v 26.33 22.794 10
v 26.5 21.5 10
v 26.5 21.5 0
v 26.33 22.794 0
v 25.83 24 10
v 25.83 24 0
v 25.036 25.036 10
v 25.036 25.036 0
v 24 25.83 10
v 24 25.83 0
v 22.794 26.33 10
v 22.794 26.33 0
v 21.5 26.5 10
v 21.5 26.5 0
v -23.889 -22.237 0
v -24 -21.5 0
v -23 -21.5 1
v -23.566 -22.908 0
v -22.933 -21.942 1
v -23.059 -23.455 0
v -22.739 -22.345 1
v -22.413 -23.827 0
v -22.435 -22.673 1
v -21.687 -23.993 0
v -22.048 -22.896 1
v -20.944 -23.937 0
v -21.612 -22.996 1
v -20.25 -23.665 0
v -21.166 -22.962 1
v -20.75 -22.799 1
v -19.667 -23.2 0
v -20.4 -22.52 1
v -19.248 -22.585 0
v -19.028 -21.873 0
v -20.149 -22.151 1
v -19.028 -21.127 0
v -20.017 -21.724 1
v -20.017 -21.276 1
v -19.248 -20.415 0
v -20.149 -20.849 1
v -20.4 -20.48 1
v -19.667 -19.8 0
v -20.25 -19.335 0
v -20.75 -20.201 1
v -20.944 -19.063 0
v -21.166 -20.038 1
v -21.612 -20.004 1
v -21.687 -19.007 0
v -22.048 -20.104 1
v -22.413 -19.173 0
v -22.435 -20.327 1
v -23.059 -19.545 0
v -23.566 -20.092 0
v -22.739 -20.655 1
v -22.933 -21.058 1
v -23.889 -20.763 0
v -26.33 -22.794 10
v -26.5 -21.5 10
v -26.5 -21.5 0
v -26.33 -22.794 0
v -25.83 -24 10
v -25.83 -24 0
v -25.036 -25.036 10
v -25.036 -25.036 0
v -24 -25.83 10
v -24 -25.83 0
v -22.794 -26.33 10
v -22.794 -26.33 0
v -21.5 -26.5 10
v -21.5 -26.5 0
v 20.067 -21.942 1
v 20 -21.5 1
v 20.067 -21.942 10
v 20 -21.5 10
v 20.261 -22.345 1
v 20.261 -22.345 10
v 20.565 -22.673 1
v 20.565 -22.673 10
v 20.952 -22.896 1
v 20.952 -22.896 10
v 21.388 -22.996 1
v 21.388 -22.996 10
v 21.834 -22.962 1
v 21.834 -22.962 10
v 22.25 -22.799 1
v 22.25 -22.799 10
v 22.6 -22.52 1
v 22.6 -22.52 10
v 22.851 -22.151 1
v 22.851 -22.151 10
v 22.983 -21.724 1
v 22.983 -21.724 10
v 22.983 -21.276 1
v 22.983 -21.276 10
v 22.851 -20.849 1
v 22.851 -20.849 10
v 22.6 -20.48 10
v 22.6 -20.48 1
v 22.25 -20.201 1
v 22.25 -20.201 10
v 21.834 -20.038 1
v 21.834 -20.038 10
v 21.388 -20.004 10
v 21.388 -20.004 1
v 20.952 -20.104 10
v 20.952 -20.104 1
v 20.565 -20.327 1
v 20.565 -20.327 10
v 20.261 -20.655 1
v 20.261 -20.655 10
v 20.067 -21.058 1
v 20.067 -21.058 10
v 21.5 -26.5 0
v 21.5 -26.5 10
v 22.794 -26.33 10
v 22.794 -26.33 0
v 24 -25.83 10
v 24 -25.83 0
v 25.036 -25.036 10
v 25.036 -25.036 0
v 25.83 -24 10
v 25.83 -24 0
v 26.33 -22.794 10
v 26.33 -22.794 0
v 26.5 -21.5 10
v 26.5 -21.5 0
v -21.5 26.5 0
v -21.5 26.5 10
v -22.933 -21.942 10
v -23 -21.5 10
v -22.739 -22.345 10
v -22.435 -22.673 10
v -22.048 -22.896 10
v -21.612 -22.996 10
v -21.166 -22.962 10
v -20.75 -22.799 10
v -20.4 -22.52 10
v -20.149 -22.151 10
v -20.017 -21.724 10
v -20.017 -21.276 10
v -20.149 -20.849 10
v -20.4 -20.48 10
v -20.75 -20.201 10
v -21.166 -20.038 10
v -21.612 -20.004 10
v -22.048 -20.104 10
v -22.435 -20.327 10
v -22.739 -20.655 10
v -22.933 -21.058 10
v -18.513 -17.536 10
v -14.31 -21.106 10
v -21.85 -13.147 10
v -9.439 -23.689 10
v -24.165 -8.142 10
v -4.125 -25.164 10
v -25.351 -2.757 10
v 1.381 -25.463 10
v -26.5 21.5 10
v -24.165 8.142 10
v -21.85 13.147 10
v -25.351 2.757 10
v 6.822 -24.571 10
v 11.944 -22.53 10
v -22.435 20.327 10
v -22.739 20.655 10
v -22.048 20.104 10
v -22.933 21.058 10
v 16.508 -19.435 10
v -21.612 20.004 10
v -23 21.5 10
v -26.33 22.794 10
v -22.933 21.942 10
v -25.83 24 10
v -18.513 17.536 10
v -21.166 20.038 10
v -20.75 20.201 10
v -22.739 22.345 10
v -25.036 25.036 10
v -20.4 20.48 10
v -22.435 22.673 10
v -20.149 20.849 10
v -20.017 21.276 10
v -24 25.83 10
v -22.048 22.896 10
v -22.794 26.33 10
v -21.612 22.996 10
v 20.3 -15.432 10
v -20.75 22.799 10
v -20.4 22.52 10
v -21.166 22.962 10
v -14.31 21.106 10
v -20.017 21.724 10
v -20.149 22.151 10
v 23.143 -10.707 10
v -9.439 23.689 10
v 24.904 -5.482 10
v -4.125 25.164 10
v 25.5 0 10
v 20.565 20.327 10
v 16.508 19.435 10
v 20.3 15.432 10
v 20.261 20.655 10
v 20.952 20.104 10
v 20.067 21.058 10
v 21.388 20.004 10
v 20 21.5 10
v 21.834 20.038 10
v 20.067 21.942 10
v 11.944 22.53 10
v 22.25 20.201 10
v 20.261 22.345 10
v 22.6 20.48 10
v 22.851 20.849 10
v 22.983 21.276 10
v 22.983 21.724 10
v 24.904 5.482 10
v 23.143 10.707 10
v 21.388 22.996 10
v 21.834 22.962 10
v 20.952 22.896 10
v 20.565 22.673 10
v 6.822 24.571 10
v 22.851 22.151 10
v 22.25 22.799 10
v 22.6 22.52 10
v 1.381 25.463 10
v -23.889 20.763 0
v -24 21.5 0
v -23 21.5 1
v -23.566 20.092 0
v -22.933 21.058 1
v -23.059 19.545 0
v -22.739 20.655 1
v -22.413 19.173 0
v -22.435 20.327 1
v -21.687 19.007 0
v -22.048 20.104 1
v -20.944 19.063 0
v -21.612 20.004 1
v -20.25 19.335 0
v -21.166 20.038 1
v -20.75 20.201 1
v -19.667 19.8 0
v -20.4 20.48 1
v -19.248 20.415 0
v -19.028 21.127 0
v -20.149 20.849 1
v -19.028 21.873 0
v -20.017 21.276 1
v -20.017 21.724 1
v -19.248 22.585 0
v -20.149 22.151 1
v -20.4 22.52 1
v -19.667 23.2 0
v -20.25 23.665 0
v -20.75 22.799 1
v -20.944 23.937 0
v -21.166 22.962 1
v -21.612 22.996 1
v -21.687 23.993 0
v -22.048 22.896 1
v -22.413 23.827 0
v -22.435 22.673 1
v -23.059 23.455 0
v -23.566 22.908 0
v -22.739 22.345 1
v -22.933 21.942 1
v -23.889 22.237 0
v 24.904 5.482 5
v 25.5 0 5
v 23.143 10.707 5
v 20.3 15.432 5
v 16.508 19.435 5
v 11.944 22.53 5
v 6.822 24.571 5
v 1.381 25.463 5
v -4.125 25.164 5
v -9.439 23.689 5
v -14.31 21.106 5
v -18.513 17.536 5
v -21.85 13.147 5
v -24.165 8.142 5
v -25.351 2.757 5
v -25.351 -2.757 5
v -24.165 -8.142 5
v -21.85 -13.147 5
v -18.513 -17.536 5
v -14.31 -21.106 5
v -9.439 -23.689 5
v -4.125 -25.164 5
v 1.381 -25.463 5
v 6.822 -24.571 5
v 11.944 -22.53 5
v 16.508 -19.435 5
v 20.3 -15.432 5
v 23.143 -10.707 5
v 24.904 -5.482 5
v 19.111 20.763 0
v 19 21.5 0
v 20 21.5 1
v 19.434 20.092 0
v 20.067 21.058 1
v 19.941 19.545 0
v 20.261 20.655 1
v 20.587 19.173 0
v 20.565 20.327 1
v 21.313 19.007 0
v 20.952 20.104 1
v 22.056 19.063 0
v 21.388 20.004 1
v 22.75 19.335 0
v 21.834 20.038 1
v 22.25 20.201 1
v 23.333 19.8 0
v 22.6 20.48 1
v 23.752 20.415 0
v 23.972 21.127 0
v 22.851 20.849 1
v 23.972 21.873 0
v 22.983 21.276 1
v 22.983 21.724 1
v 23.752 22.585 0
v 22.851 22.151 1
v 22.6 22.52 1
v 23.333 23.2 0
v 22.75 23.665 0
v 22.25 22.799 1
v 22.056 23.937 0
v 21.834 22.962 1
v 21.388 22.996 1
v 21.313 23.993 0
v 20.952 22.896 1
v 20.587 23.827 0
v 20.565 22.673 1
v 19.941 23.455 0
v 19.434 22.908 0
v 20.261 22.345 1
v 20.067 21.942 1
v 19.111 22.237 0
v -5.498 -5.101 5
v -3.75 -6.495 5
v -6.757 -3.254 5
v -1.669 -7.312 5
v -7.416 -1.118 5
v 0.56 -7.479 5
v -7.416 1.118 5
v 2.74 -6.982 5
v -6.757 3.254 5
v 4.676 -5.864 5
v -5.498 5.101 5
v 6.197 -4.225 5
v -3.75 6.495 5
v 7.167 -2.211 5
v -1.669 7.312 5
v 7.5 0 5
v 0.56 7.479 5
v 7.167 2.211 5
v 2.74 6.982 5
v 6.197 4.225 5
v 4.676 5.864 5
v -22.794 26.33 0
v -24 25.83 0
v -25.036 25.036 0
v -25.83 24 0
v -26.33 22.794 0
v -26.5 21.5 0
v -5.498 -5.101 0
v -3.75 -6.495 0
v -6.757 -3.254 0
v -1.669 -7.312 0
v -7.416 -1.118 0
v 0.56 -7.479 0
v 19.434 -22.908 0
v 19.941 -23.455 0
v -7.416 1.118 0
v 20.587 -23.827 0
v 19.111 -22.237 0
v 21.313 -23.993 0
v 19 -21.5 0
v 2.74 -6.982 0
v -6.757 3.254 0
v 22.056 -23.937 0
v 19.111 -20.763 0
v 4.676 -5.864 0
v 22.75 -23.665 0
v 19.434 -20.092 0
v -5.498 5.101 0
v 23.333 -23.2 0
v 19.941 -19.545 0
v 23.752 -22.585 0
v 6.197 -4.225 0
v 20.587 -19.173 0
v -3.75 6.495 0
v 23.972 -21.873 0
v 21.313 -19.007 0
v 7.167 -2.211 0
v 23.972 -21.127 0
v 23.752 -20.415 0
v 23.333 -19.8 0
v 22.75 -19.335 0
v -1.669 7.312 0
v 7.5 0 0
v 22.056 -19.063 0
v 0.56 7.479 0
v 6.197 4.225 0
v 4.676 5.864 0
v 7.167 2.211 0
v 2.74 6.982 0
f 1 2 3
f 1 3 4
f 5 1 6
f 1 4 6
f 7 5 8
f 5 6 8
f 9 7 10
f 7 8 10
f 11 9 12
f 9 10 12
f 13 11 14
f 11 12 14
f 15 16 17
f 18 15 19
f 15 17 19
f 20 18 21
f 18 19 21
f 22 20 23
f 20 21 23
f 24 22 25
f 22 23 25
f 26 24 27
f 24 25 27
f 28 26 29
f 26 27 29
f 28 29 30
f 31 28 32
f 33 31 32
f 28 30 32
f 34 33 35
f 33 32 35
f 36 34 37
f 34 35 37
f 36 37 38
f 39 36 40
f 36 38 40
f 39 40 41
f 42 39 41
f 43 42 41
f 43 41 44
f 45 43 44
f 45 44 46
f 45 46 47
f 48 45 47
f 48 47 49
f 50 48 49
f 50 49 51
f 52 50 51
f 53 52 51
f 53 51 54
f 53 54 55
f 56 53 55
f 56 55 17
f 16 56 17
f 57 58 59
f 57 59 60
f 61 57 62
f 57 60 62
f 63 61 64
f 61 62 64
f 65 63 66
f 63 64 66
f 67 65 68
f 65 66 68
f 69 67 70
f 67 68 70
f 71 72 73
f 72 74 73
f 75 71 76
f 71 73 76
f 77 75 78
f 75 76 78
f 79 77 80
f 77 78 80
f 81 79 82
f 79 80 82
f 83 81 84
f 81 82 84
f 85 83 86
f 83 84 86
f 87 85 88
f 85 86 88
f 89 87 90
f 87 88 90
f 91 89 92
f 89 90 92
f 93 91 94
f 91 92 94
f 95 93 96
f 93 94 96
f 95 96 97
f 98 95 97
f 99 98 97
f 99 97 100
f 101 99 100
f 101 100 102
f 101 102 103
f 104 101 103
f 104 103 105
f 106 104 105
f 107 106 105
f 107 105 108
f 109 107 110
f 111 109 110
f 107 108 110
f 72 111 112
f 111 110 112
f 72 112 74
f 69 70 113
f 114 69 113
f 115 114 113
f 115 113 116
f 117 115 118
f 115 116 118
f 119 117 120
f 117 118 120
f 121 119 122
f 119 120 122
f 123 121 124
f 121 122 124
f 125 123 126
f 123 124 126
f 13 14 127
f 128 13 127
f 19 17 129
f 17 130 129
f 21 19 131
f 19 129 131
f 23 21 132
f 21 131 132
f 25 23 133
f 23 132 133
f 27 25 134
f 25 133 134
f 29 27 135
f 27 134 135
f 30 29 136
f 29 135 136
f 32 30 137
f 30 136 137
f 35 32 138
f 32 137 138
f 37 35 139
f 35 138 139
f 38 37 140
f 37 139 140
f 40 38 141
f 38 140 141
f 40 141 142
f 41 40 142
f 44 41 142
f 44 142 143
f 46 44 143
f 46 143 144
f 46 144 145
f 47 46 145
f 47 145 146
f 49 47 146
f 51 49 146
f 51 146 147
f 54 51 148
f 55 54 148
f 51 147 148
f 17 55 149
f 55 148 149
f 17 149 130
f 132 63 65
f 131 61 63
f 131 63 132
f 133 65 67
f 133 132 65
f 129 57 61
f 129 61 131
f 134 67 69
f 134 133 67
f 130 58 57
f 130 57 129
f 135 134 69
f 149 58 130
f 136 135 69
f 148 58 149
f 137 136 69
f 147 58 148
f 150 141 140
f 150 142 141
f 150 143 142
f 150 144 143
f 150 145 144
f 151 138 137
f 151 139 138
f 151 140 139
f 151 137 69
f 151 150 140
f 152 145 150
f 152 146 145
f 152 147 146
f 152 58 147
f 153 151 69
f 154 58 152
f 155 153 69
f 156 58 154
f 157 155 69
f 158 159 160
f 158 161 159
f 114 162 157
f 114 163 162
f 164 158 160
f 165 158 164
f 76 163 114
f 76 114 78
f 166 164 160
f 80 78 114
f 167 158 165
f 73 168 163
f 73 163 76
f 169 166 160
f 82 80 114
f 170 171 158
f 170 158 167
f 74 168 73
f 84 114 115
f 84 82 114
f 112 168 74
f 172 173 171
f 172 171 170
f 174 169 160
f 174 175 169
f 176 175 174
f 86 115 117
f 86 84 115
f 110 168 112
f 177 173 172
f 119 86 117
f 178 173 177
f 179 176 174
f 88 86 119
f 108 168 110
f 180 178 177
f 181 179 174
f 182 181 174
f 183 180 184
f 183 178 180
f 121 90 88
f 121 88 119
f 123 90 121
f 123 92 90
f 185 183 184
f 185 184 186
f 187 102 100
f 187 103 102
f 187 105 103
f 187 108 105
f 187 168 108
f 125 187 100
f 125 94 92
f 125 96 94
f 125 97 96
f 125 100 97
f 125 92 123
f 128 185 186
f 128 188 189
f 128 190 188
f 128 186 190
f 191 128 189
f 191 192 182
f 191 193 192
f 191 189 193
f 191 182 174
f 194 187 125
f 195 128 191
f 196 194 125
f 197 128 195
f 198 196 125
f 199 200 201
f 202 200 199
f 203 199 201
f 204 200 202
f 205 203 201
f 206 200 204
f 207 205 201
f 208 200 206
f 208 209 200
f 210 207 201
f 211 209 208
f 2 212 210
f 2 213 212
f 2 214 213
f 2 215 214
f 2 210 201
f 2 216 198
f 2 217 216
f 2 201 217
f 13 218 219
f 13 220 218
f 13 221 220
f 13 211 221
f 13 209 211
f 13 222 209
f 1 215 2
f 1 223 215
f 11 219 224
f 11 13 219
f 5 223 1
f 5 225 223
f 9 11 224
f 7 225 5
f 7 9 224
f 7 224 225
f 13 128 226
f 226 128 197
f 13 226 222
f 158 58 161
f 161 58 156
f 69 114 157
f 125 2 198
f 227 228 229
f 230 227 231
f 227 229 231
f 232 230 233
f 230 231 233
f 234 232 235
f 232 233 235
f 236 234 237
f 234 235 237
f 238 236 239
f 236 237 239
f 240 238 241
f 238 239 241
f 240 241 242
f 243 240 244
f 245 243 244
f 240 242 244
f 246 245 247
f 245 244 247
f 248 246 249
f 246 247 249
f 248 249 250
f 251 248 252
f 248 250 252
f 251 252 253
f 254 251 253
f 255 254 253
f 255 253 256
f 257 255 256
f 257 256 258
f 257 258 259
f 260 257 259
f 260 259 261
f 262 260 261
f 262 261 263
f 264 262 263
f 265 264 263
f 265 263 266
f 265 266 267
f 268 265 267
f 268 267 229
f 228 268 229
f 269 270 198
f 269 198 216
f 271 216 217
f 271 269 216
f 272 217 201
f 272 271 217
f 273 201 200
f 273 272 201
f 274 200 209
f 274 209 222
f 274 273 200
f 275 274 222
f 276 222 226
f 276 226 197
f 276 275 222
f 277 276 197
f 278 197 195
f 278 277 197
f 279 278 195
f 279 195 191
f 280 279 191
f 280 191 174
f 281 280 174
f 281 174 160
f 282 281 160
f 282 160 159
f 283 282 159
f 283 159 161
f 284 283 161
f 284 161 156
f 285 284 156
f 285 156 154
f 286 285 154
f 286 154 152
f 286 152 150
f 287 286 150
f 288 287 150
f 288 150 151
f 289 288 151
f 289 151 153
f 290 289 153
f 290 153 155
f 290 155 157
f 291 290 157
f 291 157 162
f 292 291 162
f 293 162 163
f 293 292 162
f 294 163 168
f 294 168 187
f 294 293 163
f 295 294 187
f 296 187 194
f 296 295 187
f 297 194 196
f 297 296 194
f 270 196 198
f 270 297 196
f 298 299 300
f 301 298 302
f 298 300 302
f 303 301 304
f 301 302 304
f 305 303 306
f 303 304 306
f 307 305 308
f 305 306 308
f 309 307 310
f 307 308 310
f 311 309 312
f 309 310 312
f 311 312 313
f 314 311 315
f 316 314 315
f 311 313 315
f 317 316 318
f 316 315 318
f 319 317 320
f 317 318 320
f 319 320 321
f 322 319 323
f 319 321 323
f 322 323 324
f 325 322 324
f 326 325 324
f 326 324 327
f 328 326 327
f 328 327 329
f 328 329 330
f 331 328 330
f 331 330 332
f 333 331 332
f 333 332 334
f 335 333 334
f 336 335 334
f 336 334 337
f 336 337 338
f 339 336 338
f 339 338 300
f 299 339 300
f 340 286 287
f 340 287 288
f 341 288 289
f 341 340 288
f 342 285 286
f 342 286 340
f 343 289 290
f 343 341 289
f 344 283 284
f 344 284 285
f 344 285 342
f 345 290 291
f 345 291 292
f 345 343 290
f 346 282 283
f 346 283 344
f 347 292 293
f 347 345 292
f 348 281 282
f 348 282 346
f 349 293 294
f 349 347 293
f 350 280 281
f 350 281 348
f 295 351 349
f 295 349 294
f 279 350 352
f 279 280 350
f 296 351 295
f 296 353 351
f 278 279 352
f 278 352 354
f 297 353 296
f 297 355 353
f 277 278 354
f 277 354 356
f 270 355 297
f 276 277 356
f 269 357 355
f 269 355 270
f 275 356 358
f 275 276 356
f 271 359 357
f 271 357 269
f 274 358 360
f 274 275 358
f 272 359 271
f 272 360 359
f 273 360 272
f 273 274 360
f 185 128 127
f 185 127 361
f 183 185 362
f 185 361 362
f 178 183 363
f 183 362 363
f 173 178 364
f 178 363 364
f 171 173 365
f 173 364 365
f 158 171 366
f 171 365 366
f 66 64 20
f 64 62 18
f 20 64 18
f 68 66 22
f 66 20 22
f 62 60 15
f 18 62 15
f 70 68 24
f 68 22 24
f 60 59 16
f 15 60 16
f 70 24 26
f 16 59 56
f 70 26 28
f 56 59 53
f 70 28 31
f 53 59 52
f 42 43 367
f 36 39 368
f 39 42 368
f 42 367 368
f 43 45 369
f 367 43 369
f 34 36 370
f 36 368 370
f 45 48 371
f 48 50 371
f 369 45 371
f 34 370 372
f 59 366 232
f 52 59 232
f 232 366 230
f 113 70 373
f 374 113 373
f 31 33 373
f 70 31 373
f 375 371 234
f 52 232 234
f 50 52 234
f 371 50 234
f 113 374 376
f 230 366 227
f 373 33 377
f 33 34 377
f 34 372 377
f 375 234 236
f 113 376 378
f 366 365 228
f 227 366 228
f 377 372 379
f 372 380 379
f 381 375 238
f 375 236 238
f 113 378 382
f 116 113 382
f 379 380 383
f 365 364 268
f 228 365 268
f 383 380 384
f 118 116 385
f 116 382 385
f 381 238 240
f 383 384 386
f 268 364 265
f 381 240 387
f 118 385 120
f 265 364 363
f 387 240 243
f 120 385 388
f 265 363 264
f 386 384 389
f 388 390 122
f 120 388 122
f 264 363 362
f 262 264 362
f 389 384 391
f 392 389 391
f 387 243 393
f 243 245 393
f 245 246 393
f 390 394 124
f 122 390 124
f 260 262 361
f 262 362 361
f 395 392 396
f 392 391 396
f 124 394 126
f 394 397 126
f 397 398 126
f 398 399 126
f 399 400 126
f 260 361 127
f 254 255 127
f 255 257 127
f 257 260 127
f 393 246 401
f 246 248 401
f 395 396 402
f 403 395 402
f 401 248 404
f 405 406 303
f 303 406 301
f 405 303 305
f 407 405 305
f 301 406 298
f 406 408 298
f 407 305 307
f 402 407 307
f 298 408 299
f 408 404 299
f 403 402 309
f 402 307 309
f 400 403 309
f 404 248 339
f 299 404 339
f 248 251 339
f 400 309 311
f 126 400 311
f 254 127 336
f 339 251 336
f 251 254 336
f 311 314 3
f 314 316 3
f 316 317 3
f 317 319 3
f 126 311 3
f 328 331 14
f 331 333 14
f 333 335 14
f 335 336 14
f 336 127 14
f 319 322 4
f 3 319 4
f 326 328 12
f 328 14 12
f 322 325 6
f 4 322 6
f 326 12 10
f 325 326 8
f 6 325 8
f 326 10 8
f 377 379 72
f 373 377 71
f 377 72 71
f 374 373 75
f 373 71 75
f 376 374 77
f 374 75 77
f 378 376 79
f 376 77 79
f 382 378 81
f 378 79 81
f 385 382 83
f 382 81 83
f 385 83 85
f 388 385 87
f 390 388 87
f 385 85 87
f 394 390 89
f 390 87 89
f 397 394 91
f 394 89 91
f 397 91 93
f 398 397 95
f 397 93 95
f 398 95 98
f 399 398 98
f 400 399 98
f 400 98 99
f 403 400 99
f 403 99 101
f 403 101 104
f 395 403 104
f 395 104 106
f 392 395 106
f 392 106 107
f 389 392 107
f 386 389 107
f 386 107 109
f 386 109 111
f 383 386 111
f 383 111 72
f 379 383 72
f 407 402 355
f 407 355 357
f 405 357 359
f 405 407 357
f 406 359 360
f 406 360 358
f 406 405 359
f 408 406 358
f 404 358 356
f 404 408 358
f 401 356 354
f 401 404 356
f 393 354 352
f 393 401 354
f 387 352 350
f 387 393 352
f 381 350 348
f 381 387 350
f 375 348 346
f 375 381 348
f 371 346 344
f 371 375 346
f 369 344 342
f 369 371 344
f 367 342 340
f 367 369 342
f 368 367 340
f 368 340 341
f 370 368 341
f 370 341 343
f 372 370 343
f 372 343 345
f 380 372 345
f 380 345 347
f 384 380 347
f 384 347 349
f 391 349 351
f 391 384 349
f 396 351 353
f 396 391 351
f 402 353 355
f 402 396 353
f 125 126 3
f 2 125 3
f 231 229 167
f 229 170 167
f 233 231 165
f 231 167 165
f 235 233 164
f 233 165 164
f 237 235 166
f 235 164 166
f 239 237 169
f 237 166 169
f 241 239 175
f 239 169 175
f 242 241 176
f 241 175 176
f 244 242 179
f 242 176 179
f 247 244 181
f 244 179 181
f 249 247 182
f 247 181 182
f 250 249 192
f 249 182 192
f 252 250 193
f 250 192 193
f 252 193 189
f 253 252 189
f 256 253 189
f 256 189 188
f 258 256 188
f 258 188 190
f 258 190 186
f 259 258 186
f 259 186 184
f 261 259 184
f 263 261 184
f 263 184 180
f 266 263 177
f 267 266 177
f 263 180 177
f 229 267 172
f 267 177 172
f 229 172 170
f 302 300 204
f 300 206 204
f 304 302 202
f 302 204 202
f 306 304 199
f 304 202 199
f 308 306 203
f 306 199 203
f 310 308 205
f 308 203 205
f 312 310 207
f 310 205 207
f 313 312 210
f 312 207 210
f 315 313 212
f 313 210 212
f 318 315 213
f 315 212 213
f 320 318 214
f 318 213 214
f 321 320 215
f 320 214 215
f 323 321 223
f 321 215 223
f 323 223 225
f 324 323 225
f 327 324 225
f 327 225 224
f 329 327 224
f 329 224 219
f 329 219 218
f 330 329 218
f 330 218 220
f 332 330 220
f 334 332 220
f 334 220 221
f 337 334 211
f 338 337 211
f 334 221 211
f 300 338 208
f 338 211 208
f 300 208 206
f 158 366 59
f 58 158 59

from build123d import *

# Parameters (mm, degrees)
F0_R           = 25.5
F1_DEPTH       = 10
F0_R_2         = 7.5
F2_DEPTH       = 5
F4_D           = 3
F4_DEPTH       = 11
F4_CSINK_D     = 5
F4_CSINK_ANGLE = 90


with BuildPart() as f1:
    # F0 (on Top) → F1 (new body)
    with BuildSketch(Plane.XY):
        with BuildLine():
            Line((21.5, 26.5), (-21.5, 26.5))
            ThreePointArc((-21.5, 26.5), (-25.035534, 25.035534), (-26.5, 21.5))
            Line((-26.5, 21.5), (-26.5, -21.5))
            ThreePointArc((-26.5, -21.5), (-25.035534, -25.035534), (-21.5, -26.5))
            Line((-21.5, -26.5), (21.5, -26.5))
            ThreePointArc((21.5, -26.5), (25.035534, -25.035534), (26.5, -21.5))
            Line((26.5, -21.5), (26.5, 21.5))
            ThreePointArc((26.5, 21.5), (25.035534, 25.035534), (21.5, 26.5))
        make_face()
        Circle(F0_R, mode=Mode.SUBTRACT)
    extrude(amount=F1_DEPTH)

    # F0 (on Top) → F2 (join)
    with BuildSketch(Plane.XY):
        Circle(F0_R)
        Circle(F0_R_2, mode=Mode.SUBTRACT)
    extrude(amount=F2_DEPTH)

    # F4
    with Locations(Plane(origin=(0, 0, 0), x_dir=(1, 0, 0), z_dir=(0, 0, -1))):
        with Locations((-21.5, 21.5), (-21.5, -21.5), (21.5, -21.5), (21.5, 21.5)):
            CounterSinkHole(F4_D / 2, F4_CSINK_D / 2, depth=F4_DEPTH, counter_sink_angle=F4_CSINK_ANGLE)


solid = f1.part
